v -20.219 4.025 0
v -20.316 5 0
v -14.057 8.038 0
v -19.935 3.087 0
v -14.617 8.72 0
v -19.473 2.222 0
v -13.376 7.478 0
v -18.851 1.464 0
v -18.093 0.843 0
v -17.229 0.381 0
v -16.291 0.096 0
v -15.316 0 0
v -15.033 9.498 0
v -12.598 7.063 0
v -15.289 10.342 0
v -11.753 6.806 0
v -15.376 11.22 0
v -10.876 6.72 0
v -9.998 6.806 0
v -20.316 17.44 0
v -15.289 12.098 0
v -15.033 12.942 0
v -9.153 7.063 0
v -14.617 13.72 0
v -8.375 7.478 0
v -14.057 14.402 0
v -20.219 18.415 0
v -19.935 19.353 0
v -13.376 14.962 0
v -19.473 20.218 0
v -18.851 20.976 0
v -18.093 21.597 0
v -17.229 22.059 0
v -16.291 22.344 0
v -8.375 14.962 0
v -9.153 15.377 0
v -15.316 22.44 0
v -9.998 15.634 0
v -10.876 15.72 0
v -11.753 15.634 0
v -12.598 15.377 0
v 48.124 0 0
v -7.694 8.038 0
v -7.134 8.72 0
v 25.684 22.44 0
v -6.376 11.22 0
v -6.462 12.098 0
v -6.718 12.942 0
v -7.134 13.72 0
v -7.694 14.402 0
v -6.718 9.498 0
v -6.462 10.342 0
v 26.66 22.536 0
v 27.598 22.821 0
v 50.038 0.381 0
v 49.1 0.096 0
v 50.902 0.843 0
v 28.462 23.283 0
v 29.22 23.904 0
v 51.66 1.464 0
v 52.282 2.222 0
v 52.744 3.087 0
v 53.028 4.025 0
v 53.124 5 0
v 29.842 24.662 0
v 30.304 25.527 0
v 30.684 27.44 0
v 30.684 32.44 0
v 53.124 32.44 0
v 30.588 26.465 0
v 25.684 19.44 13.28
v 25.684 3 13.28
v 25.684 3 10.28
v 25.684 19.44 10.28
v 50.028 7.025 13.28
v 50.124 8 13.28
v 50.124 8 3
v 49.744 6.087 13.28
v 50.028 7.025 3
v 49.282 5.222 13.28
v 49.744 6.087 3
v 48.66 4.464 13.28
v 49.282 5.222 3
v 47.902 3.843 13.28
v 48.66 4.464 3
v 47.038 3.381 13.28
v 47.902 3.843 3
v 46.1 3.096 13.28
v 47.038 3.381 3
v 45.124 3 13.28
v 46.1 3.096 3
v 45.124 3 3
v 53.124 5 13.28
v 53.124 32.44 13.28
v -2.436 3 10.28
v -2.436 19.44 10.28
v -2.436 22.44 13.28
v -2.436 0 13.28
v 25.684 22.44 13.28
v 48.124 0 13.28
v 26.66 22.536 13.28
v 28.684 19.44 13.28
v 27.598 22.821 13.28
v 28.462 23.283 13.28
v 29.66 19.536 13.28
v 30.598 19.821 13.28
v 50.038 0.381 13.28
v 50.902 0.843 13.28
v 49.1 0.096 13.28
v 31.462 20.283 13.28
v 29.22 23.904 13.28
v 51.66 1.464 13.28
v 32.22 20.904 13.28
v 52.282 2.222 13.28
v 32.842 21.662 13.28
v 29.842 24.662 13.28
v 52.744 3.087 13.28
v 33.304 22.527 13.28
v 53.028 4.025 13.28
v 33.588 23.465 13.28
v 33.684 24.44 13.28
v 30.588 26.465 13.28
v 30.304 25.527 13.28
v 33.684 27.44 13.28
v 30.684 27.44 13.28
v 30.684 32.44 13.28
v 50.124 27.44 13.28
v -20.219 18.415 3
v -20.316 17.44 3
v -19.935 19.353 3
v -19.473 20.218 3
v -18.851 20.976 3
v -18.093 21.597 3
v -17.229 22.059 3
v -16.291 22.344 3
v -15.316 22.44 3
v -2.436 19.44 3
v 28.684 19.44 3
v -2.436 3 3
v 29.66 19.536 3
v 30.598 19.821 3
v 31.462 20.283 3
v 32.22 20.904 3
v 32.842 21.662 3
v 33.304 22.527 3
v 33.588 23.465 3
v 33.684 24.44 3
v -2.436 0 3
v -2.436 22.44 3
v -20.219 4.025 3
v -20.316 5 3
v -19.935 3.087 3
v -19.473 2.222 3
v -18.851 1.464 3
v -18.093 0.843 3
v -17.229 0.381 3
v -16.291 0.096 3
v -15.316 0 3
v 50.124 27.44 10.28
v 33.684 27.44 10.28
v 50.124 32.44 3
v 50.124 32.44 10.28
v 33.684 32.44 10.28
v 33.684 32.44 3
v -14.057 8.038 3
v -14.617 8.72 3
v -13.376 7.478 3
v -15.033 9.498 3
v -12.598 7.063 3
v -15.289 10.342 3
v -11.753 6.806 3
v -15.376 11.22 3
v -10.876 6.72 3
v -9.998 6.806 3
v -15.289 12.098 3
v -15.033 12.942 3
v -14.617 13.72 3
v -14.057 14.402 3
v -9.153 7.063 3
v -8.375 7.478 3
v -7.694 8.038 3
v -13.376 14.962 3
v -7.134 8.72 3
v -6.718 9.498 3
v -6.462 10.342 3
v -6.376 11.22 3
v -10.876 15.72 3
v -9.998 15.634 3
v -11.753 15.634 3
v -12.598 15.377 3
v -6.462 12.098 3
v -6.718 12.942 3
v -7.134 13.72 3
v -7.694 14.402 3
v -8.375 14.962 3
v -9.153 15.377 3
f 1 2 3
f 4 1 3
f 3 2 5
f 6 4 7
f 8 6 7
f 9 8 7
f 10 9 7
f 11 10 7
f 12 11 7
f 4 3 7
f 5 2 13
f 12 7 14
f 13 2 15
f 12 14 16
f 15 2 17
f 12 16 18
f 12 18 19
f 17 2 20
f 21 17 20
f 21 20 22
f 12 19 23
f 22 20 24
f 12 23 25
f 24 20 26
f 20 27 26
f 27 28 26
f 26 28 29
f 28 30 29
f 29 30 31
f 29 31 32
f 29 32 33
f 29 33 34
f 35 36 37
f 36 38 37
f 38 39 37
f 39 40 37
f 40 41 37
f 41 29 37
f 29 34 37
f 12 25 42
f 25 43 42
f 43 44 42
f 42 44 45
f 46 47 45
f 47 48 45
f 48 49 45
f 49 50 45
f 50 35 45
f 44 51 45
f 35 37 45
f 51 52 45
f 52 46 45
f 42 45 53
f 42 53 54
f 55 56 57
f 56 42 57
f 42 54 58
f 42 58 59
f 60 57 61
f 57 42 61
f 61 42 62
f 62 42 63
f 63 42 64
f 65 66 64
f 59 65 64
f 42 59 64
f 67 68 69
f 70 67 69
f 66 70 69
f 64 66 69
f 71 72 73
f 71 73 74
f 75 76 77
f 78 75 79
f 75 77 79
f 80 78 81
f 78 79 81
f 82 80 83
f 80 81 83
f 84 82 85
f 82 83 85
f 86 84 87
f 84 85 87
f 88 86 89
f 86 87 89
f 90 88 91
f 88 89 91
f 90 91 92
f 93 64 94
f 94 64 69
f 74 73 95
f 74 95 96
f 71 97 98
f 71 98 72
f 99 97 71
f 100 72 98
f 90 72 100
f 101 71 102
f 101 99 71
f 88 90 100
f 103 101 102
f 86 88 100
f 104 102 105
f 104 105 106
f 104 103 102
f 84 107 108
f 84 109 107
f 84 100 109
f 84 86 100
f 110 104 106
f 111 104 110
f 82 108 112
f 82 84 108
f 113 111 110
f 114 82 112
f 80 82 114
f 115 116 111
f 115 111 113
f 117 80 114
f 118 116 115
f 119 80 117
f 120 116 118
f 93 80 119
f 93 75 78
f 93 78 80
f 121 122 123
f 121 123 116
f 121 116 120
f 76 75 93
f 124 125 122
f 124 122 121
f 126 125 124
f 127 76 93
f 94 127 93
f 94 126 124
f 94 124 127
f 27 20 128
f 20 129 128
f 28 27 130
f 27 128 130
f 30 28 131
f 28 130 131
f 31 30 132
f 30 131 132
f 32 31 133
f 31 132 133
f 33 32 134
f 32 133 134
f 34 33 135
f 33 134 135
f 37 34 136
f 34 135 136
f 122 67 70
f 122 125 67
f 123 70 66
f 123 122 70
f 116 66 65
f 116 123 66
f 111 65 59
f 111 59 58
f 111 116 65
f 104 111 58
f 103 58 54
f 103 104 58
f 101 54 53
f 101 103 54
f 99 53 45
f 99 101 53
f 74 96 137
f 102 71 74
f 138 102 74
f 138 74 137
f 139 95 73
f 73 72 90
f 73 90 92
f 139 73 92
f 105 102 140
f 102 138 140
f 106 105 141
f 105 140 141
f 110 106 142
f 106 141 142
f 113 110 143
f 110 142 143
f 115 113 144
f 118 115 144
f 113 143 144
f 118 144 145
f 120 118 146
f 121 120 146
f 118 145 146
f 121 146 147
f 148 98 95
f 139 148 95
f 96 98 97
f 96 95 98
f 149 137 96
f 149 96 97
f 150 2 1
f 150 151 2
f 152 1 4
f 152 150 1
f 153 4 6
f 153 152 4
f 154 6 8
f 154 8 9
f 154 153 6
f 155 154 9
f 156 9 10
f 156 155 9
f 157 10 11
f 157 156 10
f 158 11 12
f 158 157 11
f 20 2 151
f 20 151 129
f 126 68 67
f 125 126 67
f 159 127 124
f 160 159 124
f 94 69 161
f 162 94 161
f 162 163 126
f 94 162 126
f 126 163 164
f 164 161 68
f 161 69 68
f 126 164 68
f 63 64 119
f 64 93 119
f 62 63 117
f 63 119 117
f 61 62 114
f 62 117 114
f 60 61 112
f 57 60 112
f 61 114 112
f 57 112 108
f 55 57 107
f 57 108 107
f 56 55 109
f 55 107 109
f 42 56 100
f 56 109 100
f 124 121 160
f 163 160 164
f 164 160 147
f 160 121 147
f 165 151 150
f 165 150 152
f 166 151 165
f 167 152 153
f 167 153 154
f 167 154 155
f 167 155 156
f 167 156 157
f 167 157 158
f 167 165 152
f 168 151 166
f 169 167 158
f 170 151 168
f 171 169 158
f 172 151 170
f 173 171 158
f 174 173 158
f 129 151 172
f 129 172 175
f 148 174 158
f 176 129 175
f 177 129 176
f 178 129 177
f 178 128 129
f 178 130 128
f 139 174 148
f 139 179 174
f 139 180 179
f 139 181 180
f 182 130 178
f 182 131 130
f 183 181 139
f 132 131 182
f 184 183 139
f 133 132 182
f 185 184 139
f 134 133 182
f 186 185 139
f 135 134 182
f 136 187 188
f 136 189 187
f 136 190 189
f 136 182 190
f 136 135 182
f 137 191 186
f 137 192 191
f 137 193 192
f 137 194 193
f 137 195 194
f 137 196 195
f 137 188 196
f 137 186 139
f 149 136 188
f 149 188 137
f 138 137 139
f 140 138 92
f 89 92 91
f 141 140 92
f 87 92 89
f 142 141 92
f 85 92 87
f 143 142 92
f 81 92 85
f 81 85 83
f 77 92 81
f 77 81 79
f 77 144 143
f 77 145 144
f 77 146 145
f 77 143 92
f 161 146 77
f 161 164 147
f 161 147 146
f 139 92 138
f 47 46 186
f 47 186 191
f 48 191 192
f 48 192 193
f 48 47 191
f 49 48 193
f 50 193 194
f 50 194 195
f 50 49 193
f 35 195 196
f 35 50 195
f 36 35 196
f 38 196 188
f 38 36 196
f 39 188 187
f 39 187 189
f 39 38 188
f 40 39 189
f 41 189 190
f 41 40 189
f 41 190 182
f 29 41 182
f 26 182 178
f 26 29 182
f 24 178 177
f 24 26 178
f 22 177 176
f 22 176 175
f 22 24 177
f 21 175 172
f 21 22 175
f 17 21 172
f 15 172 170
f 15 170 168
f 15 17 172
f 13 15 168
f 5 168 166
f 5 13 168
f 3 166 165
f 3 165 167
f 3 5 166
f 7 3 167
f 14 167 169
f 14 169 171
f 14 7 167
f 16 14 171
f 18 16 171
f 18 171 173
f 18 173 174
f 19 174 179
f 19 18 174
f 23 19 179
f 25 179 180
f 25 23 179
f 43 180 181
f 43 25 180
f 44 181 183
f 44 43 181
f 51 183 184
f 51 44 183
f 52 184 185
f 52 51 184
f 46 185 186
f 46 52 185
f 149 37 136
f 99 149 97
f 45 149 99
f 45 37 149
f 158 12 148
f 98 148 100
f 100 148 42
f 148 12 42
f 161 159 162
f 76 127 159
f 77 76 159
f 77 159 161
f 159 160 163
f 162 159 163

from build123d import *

# Parameters (mm, degrees)
F0_W     = 33.12
F0_H     = 22.44
F1_DEPTH = 13.28
F0_W_2   = 17.88
F0_R     = 4.5
F2_DEPTH = 3
F3_T     = -3
F4_W     = 8
F4_H     = 16.44
F5_DEPTH = 3
F6_R     = 5


# Not quite as in the source:
# - a shell that OpenCascade refuses in one call is made with other operations: the cavity is built on its own and cut out
# - a feature names something its author has since deleted; it is built from what else it names


with BuildPart() as f1:
    # F0 (on Top) → F1 (new body)
    with BuildSketch(Plane.XY):
        Polygon((30.6844967631, 22.44), (30.6844967631, 0), (53.1244967631, 0), (53.1244967631, 32.44), (30.6844967631, 32.44), align=None)
        with Locations((14.1244967631, 11.22)):
            Rectangle(F0_W, F0_H)
    extrude(amount=F1_DEPTH)

    # F0 (on Top) → F2 (join)
    with BuildSketch(Plane.XY):
        with Locations((-11.3755032369, 11.22)):
            Rectangle(F0_W_2, F0_H)
        with Locations((-10.8755032369, 11.22)):
            Circle(F0_R, mode=Mode.SUBTRACT)
    extrude(amount=F2_DEPTH)

    # F3: a shell. OpenCascade refuses it in one call, so the cavity is built on its own and cut out:
    # the body offset inwards by the wall thickness, plus a prism from it out through each open face.
    f3_core = offset(f1.part, amount=F3_T, kind=Kind.INTERSECTION, mode=Mode.PRIVATE)
    f3_exits = [f3_core.faces().sort_by_distance(p)[0] for p in [
        (0.564497, 11.22, 6.64),
        (41.904497, 29.44, 6.64),
    ]]
    add(f3_core, mode=Mode.SUBTRACT)
    extrude(f3_exits, amount=-F3_T, mode=Mode.SUBTRACT)

    # F4 (on face) → F5 (cut)
    with BuildSketch(Plane.XY.offset(13.28)):
        with Locations((29.6844967631, 11.22)):
            Rectangle(F4_W, F4_H)
        Polygon((50.1244967631, 27.44), (33.6844967631, 27.44), (33.6844967631, 19.44), (33.6844967631, 3), (50.1244967631, 3), align=None)
    extrude(amount=-F5_DEPTH, mode=Mode.SUBTRACT)

    # F6
    f6_edges = [f1.edges().sort_by_distance(p)[0] for p in [
        (53.124497, 0, 6.64),
        (30.684497, 22.44, 6.64),
        (33.684497, 19.44, 8.14),
        (50.124497, 3, 8.14),
        (-20.315503, 22.44, 1.5),
        (-20.315503, 0, 1.5),
    ]]
    fillet(f6_edges, radius=F6_R)


solid = f1.part
